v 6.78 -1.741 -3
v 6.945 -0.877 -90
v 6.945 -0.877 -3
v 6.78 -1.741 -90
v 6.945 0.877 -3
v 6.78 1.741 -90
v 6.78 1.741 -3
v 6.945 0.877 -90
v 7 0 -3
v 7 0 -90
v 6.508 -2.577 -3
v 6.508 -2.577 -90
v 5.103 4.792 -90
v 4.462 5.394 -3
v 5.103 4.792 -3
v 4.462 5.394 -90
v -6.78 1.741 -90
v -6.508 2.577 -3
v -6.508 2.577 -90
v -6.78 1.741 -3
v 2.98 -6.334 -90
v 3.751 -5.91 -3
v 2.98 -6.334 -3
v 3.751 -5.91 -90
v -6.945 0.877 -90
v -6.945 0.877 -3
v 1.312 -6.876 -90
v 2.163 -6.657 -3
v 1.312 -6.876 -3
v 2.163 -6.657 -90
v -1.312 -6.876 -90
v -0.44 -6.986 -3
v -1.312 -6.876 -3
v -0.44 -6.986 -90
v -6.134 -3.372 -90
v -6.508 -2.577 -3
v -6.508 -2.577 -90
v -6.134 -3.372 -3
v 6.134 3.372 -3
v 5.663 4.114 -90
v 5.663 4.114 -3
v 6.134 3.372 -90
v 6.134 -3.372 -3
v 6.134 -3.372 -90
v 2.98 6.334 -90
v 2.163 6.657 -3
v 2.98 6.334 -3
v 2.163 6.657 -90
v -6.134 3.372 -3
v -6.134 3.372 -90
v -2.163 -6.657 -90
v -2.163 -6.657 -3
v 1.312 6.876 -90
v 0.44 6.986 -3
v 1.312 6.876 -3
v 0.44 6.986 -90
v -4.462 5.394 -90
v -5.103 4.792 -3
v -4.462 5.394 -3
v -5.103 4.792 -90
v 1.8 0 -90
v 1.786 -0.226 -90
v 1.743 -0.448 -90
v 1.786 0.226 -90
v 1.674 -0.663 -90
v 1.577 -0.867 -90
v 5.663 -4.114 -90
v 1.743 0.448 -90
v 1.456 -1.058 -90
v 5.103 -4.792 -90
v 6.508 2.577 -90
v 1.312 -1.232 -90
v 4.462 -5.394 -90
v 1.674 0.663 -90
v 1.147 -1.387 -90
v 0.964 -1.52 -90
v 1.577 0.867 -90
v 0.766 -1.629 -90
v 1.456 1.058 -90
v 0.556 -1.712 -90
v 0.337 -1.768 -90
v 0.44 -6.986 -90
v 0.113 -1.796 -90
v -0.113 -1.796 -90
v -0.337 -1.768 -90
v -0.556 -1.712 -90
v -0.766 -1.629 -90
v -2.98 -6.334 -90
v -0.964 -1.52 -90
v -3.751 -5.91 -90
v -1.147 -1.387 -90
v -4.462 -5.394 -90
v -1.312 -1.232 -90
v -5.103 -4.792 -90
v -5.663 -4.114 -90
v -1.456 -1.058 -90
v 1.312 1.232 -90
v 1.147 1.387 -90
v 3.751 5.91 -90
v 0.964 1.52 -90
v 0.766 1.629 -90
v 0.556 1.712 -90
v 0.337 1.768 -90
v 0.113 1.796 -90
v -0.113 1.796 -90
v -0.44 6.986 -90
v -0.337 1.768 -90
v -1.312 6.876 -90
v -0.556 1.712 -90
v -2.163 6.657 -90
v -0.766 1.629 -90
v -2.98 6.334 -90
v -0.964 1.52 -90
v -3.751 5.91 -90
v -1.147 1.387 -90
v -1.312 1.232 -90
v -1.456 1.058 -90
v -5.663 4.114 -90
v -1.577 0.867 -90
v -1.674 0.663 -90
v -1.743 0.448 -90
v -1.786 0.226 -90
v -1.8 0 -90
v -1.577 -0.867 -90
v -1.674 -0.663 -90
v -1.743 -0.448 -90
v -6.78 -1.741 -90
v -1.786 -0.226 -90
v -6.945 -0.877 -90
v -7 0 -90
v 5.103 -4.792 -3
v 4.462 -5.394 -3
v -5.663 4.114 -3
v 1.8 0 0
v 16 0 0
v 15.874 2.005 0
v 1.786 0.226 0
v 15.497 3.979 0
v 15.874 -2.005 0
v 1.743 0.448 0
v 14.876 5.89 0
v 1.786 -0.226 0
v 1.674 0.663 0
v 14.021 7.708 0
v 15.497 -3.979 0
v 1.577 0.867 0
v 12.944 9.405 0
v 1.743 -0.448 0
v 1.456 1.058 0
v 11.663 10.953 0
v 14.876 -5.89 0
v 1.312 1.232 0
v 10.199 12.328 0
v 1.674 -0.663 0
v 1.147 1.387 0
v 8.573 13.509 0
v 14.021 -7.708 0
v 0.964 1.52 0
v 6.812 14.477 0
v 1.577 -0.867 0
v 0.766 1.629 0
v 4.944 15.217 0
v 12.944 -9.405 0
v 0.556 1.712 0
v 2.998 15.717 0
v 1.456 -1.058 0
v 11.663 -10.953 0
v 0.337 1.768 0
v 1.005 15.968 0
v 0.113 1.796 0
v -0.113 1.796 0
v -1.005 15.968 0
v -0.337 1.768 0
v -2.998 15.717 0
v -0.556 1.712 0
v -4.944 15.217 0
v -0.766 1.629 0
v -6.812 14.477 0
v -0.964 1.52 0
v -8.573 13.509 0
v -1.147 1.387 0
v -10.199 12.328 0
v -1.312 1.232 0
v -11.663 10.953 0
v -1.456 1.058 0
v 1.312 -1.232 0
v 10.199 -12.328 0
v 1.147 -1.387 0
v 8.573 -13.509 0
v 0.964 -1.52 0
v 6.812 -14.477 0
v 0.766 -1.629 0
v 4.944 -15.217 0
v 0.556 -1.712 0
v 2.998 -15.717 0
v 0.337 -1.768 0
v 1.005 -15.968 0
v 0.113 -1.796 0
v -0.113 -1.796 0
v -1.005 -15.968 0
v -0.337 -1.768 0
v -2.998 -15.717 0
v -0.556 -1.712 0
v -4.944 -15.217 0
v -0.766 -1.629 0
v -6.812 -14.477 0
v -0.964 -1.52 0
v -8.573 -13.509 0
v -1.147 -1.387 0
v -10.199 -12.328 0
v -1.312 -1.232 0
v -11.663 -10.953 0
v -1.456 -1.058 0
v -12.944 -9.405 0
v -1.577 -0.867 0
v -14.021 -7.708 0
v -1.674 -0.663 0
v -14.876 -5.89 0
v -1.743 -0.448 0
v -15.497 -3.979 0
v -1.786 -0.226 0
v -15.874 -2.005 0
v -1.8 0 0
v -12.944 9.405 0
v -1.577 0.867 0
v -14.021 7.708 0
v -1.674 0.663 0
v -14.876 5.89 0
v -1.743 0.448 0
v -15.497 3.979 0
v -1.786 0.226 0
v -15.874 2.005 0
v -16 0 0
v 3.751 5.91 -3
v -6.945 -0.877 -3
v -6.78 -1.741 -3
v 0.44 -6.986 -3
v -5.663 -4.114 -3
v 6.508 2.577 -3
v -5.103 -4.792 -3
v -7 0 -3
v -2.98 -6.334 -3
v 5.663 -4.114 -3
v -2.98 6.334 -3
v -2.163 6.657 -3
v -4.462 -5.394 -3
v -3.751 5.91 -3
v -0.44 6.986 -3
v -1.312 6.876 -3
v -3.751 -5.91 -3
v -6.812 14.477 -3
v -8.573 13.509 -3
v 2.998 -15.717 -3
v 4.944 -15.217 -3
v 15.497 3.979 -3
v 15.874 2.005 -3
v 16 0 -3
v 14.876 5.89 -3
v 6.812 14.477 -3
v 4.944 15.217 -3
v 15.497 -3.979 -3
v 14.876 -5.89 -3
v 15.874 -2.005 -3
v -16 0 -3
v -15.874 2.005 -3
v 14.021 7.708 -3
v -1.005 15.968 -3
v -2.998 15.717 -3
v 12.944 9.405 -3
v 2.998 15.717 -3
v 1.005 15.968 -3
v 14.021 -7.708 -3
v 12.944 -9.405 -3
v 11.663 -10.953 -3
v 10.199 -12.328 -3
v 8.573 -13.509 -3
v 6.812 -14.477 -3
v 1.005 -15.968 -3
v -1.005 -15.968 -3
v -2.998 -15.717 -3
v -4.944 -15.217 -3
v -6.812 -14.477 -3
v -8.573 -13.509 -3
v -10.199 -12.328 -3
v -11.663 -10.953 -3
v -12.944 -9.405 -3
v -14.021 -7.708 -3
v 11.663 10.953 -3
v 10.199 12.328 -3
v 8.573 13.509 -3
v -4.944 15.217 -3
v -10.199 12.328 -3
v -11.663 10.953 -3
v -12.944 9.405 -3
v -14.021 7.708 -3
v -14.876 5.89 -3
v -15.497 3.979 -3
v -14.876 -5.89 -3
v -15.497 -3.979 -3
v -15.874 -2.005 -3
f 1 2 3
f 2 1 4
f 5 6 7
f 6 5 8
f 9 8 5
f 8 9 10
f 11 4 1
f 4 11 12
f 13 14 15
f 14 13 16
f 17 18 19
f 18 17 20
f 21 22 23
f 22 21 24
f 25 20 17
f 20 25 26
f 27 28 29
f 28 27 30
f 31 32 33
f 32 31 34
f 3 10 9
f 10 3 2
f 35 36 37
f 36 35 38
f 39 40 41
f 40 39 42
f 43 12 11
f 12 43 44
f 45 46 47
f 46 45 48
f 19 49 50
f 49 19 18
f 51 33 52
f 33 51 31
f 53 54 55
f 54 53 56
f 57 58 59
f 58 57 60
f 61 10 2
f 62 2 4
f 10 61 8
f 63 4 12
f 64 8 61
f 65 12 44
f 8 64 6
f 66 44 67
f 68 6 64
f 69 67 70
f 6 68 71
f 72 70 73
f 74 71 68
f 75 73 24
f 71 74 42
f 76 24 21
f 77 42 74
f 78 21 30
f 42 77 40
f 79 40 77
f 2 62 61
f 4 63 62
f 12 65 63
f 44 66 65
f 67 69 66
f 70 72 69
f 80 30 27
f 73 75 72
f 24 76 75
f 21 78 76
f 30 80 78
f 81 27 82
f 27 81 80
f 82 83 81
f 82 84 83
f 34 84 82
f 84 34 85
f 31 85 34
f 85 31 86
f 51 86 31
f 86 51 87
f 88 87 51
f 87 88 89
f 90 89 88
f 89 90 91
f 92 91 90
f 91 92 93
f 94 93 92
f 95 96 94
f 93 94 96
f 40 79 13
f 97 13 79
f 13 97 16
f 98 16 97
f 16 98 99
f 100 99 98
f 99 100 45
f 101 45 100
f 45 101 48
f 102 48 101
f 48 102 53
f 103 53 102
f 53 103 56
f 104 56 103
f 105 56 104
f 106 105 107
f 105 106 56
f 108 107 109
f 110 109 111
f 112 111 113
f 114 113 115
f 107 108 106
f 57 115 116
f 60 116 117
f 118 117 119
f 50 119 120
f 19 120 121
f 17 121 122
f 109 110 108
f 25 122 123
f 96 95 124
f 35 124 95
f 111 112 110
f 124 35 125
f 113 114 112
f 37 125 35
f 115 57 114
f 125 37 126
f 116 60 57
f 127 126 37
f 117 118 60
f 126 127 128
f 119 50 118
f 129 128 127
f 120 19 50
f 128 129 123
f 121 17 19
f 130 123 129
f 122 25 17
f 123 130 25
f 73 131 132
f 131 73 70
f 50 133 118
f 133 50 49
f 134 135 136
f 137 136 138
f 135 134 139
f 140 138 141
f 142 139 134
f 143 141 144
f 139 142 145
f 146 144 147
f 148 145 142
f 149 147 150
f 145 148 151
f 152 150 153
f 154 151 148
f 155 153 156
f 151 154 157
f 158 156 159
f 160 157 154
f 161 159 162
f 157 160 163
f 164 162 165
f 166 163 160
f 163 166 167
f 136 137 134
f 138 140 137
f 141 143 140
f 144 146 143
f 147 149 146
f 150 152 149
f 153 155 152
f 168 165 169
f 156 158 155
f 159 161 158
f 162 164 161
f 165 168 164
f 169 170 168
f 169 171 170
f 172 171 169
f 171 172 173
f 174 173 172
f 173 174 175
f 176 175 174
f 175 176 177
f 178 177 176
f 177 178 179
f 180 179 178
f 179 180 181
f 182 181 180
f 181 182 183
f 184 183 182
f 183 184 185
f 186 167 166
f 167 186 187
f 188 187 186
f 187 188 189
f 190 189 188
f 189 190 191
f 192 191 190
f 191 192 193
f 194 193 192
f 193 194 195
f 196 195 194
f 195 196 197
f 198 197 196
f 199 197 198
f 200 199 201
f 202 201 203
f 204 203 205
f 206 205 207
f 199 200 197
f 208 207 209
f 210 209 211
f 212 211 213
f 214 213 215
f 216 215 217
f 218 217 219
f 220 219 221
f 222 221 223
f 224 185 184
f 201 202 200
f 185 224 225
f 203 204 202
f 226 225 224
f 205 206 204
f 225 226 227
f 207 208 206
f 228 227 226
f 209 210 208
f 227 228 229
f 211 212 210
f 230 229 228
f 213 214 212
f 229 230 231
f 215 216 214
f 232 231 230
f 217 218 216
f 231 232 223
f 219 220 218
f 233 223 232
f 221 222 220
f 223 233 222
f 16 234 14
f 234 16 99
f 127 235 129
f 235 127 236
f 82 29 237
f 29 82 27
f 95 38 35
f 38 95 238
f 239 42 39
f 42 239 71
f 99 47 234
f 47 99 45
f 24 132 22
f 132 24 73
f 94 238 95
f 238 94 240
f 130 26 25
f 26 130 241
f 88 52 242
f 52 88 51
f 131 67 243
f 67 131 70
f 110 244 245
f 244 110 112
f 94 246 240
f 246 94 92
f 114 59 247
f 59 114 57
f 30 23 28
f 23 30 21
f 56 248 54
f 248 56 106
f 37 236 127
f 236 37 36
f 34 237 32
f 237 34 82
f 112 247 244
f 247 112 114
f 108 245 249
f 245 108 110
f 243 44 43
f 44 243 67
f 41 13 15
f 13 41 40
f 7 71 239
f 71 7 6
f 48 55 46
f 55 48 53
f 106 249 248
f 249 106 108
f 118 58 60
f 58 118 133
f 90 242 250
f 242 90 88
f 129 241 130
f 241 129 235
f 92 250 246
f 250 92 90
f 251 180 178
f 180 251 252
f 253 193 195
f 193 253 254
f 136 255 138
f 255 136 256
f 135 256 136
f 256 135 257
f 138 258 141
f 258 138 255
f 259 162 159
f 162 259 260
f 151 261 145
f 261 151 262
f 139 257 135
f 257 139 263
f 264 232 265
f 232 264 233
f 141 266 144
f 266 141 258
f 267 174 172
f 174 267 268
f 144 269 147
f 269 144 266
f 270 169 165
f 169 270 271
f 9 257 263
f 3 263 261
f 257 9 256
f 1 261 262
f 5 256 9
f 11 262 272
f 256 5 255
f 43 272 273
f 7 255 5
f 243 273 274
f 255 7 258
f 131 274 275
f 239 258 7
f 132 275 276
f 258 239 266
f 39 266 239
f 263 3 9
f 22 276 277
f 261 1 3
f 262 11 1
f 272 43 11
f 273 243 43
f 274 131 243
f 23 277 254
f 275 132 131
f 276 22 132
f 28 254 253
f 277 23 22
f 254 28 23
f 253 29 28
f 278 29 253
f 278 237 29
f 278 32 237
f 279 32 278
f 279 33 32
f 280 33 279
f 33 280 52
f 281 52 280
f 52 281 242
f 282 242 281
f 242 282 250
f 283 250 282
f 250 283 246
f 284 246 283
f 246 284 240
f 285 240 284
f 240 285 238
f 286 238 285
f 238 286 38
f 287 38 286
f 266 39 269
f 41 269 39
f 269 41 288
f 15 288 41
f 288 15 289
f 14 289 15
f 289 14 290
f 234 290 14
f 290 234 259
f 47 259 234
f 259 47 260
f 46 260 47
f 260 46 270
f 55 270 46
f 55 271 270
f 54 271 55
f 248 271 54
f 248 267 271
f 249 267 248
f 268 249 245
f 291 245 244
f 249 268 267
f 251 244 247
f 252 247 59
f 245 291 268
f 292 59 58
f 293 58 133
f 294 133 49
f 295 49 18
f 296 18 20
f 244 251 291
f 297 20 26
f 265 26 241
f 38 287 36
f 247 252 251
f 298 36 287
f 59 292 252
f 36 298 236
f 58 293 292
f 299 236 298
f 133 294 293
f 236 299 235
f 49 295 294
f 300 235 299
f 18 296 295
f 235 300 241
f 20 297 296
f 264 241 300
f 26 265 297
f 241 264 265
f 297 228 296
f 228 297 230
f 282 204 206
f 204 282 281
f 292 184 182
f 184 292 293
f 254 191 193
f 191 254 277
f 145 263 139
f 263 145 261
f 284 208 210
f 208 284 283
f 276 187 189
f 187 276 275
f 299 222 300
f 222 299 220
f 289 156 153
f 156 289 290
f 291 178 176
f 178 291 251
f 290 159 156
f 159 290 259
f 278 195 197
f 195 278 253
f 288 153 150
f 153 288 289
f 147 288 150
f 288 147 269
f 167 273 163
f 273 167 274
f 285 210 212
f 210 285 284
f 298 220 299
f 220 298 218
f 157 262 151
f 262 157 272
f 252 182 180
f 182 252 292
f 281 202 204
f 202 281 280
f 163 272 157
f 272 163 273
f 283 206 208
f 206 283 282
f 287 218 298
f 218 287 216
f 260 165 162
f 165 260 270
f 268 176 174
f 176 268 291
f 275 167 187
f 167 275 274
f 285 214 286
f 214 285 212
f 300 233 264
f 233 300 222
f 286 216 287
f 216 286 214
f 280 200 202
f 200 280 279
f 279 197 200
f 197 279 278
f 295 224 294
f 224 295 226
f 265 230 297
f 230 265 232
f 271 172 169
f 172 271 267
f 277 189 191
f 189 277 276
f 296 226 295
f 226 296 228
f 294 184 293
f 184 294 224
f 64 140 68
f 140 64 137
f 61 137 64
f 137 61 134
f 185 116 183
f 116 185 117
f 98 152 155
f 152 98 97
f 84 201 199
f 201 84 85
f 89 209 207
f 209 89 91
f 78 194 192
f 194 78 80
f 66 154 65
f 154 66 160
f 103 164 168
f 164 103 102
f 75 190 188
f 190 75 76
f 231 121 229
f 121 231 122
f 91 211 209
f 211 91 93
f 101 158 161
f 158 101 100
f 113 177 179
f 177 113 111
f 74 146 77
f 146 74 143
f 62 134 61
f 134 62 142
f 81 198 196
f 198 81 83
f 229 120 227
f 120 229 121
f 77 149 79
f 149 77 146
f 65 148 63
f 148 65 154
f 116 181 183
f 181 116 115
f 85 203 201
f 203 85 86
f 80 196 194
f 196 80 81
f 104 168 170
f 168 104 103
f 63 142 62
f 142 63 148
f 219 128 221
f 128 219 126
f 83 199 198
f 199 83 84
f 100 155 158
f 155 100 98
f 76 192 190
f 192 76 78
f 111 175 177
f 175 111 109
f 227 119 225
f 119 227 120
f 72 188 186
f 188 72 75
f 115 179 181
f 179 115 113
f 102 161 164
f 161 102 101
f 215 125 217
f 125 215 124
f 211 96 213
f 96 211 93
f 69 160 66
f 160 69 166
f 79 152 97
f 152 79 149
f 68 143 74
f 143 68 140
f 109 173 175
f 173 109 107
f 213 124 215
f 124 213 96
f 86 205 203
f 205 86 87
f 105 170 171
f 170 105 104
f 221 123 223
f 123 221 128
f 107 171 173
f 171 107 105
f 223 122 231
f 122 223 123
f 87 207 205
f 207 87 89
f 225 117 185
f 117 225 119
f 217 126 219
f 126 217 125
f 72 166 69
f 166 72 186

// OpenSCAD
$fn = 50;


difference() {
	union() {
		translate(v = [0, 0, -90.0000000000]) {
			cylinder(h = 90, r = 7.0000000000);
		}
		translate(v = [0, 0, -3.0000000000]) {
			cylinder(h = 3, r = 16.0000000000);
		}
	}
	union() {
		#translate(v = [0, 0, -90]) {
			cylinder(h = 90, r = 1.8000000000);
		}
	}
}
